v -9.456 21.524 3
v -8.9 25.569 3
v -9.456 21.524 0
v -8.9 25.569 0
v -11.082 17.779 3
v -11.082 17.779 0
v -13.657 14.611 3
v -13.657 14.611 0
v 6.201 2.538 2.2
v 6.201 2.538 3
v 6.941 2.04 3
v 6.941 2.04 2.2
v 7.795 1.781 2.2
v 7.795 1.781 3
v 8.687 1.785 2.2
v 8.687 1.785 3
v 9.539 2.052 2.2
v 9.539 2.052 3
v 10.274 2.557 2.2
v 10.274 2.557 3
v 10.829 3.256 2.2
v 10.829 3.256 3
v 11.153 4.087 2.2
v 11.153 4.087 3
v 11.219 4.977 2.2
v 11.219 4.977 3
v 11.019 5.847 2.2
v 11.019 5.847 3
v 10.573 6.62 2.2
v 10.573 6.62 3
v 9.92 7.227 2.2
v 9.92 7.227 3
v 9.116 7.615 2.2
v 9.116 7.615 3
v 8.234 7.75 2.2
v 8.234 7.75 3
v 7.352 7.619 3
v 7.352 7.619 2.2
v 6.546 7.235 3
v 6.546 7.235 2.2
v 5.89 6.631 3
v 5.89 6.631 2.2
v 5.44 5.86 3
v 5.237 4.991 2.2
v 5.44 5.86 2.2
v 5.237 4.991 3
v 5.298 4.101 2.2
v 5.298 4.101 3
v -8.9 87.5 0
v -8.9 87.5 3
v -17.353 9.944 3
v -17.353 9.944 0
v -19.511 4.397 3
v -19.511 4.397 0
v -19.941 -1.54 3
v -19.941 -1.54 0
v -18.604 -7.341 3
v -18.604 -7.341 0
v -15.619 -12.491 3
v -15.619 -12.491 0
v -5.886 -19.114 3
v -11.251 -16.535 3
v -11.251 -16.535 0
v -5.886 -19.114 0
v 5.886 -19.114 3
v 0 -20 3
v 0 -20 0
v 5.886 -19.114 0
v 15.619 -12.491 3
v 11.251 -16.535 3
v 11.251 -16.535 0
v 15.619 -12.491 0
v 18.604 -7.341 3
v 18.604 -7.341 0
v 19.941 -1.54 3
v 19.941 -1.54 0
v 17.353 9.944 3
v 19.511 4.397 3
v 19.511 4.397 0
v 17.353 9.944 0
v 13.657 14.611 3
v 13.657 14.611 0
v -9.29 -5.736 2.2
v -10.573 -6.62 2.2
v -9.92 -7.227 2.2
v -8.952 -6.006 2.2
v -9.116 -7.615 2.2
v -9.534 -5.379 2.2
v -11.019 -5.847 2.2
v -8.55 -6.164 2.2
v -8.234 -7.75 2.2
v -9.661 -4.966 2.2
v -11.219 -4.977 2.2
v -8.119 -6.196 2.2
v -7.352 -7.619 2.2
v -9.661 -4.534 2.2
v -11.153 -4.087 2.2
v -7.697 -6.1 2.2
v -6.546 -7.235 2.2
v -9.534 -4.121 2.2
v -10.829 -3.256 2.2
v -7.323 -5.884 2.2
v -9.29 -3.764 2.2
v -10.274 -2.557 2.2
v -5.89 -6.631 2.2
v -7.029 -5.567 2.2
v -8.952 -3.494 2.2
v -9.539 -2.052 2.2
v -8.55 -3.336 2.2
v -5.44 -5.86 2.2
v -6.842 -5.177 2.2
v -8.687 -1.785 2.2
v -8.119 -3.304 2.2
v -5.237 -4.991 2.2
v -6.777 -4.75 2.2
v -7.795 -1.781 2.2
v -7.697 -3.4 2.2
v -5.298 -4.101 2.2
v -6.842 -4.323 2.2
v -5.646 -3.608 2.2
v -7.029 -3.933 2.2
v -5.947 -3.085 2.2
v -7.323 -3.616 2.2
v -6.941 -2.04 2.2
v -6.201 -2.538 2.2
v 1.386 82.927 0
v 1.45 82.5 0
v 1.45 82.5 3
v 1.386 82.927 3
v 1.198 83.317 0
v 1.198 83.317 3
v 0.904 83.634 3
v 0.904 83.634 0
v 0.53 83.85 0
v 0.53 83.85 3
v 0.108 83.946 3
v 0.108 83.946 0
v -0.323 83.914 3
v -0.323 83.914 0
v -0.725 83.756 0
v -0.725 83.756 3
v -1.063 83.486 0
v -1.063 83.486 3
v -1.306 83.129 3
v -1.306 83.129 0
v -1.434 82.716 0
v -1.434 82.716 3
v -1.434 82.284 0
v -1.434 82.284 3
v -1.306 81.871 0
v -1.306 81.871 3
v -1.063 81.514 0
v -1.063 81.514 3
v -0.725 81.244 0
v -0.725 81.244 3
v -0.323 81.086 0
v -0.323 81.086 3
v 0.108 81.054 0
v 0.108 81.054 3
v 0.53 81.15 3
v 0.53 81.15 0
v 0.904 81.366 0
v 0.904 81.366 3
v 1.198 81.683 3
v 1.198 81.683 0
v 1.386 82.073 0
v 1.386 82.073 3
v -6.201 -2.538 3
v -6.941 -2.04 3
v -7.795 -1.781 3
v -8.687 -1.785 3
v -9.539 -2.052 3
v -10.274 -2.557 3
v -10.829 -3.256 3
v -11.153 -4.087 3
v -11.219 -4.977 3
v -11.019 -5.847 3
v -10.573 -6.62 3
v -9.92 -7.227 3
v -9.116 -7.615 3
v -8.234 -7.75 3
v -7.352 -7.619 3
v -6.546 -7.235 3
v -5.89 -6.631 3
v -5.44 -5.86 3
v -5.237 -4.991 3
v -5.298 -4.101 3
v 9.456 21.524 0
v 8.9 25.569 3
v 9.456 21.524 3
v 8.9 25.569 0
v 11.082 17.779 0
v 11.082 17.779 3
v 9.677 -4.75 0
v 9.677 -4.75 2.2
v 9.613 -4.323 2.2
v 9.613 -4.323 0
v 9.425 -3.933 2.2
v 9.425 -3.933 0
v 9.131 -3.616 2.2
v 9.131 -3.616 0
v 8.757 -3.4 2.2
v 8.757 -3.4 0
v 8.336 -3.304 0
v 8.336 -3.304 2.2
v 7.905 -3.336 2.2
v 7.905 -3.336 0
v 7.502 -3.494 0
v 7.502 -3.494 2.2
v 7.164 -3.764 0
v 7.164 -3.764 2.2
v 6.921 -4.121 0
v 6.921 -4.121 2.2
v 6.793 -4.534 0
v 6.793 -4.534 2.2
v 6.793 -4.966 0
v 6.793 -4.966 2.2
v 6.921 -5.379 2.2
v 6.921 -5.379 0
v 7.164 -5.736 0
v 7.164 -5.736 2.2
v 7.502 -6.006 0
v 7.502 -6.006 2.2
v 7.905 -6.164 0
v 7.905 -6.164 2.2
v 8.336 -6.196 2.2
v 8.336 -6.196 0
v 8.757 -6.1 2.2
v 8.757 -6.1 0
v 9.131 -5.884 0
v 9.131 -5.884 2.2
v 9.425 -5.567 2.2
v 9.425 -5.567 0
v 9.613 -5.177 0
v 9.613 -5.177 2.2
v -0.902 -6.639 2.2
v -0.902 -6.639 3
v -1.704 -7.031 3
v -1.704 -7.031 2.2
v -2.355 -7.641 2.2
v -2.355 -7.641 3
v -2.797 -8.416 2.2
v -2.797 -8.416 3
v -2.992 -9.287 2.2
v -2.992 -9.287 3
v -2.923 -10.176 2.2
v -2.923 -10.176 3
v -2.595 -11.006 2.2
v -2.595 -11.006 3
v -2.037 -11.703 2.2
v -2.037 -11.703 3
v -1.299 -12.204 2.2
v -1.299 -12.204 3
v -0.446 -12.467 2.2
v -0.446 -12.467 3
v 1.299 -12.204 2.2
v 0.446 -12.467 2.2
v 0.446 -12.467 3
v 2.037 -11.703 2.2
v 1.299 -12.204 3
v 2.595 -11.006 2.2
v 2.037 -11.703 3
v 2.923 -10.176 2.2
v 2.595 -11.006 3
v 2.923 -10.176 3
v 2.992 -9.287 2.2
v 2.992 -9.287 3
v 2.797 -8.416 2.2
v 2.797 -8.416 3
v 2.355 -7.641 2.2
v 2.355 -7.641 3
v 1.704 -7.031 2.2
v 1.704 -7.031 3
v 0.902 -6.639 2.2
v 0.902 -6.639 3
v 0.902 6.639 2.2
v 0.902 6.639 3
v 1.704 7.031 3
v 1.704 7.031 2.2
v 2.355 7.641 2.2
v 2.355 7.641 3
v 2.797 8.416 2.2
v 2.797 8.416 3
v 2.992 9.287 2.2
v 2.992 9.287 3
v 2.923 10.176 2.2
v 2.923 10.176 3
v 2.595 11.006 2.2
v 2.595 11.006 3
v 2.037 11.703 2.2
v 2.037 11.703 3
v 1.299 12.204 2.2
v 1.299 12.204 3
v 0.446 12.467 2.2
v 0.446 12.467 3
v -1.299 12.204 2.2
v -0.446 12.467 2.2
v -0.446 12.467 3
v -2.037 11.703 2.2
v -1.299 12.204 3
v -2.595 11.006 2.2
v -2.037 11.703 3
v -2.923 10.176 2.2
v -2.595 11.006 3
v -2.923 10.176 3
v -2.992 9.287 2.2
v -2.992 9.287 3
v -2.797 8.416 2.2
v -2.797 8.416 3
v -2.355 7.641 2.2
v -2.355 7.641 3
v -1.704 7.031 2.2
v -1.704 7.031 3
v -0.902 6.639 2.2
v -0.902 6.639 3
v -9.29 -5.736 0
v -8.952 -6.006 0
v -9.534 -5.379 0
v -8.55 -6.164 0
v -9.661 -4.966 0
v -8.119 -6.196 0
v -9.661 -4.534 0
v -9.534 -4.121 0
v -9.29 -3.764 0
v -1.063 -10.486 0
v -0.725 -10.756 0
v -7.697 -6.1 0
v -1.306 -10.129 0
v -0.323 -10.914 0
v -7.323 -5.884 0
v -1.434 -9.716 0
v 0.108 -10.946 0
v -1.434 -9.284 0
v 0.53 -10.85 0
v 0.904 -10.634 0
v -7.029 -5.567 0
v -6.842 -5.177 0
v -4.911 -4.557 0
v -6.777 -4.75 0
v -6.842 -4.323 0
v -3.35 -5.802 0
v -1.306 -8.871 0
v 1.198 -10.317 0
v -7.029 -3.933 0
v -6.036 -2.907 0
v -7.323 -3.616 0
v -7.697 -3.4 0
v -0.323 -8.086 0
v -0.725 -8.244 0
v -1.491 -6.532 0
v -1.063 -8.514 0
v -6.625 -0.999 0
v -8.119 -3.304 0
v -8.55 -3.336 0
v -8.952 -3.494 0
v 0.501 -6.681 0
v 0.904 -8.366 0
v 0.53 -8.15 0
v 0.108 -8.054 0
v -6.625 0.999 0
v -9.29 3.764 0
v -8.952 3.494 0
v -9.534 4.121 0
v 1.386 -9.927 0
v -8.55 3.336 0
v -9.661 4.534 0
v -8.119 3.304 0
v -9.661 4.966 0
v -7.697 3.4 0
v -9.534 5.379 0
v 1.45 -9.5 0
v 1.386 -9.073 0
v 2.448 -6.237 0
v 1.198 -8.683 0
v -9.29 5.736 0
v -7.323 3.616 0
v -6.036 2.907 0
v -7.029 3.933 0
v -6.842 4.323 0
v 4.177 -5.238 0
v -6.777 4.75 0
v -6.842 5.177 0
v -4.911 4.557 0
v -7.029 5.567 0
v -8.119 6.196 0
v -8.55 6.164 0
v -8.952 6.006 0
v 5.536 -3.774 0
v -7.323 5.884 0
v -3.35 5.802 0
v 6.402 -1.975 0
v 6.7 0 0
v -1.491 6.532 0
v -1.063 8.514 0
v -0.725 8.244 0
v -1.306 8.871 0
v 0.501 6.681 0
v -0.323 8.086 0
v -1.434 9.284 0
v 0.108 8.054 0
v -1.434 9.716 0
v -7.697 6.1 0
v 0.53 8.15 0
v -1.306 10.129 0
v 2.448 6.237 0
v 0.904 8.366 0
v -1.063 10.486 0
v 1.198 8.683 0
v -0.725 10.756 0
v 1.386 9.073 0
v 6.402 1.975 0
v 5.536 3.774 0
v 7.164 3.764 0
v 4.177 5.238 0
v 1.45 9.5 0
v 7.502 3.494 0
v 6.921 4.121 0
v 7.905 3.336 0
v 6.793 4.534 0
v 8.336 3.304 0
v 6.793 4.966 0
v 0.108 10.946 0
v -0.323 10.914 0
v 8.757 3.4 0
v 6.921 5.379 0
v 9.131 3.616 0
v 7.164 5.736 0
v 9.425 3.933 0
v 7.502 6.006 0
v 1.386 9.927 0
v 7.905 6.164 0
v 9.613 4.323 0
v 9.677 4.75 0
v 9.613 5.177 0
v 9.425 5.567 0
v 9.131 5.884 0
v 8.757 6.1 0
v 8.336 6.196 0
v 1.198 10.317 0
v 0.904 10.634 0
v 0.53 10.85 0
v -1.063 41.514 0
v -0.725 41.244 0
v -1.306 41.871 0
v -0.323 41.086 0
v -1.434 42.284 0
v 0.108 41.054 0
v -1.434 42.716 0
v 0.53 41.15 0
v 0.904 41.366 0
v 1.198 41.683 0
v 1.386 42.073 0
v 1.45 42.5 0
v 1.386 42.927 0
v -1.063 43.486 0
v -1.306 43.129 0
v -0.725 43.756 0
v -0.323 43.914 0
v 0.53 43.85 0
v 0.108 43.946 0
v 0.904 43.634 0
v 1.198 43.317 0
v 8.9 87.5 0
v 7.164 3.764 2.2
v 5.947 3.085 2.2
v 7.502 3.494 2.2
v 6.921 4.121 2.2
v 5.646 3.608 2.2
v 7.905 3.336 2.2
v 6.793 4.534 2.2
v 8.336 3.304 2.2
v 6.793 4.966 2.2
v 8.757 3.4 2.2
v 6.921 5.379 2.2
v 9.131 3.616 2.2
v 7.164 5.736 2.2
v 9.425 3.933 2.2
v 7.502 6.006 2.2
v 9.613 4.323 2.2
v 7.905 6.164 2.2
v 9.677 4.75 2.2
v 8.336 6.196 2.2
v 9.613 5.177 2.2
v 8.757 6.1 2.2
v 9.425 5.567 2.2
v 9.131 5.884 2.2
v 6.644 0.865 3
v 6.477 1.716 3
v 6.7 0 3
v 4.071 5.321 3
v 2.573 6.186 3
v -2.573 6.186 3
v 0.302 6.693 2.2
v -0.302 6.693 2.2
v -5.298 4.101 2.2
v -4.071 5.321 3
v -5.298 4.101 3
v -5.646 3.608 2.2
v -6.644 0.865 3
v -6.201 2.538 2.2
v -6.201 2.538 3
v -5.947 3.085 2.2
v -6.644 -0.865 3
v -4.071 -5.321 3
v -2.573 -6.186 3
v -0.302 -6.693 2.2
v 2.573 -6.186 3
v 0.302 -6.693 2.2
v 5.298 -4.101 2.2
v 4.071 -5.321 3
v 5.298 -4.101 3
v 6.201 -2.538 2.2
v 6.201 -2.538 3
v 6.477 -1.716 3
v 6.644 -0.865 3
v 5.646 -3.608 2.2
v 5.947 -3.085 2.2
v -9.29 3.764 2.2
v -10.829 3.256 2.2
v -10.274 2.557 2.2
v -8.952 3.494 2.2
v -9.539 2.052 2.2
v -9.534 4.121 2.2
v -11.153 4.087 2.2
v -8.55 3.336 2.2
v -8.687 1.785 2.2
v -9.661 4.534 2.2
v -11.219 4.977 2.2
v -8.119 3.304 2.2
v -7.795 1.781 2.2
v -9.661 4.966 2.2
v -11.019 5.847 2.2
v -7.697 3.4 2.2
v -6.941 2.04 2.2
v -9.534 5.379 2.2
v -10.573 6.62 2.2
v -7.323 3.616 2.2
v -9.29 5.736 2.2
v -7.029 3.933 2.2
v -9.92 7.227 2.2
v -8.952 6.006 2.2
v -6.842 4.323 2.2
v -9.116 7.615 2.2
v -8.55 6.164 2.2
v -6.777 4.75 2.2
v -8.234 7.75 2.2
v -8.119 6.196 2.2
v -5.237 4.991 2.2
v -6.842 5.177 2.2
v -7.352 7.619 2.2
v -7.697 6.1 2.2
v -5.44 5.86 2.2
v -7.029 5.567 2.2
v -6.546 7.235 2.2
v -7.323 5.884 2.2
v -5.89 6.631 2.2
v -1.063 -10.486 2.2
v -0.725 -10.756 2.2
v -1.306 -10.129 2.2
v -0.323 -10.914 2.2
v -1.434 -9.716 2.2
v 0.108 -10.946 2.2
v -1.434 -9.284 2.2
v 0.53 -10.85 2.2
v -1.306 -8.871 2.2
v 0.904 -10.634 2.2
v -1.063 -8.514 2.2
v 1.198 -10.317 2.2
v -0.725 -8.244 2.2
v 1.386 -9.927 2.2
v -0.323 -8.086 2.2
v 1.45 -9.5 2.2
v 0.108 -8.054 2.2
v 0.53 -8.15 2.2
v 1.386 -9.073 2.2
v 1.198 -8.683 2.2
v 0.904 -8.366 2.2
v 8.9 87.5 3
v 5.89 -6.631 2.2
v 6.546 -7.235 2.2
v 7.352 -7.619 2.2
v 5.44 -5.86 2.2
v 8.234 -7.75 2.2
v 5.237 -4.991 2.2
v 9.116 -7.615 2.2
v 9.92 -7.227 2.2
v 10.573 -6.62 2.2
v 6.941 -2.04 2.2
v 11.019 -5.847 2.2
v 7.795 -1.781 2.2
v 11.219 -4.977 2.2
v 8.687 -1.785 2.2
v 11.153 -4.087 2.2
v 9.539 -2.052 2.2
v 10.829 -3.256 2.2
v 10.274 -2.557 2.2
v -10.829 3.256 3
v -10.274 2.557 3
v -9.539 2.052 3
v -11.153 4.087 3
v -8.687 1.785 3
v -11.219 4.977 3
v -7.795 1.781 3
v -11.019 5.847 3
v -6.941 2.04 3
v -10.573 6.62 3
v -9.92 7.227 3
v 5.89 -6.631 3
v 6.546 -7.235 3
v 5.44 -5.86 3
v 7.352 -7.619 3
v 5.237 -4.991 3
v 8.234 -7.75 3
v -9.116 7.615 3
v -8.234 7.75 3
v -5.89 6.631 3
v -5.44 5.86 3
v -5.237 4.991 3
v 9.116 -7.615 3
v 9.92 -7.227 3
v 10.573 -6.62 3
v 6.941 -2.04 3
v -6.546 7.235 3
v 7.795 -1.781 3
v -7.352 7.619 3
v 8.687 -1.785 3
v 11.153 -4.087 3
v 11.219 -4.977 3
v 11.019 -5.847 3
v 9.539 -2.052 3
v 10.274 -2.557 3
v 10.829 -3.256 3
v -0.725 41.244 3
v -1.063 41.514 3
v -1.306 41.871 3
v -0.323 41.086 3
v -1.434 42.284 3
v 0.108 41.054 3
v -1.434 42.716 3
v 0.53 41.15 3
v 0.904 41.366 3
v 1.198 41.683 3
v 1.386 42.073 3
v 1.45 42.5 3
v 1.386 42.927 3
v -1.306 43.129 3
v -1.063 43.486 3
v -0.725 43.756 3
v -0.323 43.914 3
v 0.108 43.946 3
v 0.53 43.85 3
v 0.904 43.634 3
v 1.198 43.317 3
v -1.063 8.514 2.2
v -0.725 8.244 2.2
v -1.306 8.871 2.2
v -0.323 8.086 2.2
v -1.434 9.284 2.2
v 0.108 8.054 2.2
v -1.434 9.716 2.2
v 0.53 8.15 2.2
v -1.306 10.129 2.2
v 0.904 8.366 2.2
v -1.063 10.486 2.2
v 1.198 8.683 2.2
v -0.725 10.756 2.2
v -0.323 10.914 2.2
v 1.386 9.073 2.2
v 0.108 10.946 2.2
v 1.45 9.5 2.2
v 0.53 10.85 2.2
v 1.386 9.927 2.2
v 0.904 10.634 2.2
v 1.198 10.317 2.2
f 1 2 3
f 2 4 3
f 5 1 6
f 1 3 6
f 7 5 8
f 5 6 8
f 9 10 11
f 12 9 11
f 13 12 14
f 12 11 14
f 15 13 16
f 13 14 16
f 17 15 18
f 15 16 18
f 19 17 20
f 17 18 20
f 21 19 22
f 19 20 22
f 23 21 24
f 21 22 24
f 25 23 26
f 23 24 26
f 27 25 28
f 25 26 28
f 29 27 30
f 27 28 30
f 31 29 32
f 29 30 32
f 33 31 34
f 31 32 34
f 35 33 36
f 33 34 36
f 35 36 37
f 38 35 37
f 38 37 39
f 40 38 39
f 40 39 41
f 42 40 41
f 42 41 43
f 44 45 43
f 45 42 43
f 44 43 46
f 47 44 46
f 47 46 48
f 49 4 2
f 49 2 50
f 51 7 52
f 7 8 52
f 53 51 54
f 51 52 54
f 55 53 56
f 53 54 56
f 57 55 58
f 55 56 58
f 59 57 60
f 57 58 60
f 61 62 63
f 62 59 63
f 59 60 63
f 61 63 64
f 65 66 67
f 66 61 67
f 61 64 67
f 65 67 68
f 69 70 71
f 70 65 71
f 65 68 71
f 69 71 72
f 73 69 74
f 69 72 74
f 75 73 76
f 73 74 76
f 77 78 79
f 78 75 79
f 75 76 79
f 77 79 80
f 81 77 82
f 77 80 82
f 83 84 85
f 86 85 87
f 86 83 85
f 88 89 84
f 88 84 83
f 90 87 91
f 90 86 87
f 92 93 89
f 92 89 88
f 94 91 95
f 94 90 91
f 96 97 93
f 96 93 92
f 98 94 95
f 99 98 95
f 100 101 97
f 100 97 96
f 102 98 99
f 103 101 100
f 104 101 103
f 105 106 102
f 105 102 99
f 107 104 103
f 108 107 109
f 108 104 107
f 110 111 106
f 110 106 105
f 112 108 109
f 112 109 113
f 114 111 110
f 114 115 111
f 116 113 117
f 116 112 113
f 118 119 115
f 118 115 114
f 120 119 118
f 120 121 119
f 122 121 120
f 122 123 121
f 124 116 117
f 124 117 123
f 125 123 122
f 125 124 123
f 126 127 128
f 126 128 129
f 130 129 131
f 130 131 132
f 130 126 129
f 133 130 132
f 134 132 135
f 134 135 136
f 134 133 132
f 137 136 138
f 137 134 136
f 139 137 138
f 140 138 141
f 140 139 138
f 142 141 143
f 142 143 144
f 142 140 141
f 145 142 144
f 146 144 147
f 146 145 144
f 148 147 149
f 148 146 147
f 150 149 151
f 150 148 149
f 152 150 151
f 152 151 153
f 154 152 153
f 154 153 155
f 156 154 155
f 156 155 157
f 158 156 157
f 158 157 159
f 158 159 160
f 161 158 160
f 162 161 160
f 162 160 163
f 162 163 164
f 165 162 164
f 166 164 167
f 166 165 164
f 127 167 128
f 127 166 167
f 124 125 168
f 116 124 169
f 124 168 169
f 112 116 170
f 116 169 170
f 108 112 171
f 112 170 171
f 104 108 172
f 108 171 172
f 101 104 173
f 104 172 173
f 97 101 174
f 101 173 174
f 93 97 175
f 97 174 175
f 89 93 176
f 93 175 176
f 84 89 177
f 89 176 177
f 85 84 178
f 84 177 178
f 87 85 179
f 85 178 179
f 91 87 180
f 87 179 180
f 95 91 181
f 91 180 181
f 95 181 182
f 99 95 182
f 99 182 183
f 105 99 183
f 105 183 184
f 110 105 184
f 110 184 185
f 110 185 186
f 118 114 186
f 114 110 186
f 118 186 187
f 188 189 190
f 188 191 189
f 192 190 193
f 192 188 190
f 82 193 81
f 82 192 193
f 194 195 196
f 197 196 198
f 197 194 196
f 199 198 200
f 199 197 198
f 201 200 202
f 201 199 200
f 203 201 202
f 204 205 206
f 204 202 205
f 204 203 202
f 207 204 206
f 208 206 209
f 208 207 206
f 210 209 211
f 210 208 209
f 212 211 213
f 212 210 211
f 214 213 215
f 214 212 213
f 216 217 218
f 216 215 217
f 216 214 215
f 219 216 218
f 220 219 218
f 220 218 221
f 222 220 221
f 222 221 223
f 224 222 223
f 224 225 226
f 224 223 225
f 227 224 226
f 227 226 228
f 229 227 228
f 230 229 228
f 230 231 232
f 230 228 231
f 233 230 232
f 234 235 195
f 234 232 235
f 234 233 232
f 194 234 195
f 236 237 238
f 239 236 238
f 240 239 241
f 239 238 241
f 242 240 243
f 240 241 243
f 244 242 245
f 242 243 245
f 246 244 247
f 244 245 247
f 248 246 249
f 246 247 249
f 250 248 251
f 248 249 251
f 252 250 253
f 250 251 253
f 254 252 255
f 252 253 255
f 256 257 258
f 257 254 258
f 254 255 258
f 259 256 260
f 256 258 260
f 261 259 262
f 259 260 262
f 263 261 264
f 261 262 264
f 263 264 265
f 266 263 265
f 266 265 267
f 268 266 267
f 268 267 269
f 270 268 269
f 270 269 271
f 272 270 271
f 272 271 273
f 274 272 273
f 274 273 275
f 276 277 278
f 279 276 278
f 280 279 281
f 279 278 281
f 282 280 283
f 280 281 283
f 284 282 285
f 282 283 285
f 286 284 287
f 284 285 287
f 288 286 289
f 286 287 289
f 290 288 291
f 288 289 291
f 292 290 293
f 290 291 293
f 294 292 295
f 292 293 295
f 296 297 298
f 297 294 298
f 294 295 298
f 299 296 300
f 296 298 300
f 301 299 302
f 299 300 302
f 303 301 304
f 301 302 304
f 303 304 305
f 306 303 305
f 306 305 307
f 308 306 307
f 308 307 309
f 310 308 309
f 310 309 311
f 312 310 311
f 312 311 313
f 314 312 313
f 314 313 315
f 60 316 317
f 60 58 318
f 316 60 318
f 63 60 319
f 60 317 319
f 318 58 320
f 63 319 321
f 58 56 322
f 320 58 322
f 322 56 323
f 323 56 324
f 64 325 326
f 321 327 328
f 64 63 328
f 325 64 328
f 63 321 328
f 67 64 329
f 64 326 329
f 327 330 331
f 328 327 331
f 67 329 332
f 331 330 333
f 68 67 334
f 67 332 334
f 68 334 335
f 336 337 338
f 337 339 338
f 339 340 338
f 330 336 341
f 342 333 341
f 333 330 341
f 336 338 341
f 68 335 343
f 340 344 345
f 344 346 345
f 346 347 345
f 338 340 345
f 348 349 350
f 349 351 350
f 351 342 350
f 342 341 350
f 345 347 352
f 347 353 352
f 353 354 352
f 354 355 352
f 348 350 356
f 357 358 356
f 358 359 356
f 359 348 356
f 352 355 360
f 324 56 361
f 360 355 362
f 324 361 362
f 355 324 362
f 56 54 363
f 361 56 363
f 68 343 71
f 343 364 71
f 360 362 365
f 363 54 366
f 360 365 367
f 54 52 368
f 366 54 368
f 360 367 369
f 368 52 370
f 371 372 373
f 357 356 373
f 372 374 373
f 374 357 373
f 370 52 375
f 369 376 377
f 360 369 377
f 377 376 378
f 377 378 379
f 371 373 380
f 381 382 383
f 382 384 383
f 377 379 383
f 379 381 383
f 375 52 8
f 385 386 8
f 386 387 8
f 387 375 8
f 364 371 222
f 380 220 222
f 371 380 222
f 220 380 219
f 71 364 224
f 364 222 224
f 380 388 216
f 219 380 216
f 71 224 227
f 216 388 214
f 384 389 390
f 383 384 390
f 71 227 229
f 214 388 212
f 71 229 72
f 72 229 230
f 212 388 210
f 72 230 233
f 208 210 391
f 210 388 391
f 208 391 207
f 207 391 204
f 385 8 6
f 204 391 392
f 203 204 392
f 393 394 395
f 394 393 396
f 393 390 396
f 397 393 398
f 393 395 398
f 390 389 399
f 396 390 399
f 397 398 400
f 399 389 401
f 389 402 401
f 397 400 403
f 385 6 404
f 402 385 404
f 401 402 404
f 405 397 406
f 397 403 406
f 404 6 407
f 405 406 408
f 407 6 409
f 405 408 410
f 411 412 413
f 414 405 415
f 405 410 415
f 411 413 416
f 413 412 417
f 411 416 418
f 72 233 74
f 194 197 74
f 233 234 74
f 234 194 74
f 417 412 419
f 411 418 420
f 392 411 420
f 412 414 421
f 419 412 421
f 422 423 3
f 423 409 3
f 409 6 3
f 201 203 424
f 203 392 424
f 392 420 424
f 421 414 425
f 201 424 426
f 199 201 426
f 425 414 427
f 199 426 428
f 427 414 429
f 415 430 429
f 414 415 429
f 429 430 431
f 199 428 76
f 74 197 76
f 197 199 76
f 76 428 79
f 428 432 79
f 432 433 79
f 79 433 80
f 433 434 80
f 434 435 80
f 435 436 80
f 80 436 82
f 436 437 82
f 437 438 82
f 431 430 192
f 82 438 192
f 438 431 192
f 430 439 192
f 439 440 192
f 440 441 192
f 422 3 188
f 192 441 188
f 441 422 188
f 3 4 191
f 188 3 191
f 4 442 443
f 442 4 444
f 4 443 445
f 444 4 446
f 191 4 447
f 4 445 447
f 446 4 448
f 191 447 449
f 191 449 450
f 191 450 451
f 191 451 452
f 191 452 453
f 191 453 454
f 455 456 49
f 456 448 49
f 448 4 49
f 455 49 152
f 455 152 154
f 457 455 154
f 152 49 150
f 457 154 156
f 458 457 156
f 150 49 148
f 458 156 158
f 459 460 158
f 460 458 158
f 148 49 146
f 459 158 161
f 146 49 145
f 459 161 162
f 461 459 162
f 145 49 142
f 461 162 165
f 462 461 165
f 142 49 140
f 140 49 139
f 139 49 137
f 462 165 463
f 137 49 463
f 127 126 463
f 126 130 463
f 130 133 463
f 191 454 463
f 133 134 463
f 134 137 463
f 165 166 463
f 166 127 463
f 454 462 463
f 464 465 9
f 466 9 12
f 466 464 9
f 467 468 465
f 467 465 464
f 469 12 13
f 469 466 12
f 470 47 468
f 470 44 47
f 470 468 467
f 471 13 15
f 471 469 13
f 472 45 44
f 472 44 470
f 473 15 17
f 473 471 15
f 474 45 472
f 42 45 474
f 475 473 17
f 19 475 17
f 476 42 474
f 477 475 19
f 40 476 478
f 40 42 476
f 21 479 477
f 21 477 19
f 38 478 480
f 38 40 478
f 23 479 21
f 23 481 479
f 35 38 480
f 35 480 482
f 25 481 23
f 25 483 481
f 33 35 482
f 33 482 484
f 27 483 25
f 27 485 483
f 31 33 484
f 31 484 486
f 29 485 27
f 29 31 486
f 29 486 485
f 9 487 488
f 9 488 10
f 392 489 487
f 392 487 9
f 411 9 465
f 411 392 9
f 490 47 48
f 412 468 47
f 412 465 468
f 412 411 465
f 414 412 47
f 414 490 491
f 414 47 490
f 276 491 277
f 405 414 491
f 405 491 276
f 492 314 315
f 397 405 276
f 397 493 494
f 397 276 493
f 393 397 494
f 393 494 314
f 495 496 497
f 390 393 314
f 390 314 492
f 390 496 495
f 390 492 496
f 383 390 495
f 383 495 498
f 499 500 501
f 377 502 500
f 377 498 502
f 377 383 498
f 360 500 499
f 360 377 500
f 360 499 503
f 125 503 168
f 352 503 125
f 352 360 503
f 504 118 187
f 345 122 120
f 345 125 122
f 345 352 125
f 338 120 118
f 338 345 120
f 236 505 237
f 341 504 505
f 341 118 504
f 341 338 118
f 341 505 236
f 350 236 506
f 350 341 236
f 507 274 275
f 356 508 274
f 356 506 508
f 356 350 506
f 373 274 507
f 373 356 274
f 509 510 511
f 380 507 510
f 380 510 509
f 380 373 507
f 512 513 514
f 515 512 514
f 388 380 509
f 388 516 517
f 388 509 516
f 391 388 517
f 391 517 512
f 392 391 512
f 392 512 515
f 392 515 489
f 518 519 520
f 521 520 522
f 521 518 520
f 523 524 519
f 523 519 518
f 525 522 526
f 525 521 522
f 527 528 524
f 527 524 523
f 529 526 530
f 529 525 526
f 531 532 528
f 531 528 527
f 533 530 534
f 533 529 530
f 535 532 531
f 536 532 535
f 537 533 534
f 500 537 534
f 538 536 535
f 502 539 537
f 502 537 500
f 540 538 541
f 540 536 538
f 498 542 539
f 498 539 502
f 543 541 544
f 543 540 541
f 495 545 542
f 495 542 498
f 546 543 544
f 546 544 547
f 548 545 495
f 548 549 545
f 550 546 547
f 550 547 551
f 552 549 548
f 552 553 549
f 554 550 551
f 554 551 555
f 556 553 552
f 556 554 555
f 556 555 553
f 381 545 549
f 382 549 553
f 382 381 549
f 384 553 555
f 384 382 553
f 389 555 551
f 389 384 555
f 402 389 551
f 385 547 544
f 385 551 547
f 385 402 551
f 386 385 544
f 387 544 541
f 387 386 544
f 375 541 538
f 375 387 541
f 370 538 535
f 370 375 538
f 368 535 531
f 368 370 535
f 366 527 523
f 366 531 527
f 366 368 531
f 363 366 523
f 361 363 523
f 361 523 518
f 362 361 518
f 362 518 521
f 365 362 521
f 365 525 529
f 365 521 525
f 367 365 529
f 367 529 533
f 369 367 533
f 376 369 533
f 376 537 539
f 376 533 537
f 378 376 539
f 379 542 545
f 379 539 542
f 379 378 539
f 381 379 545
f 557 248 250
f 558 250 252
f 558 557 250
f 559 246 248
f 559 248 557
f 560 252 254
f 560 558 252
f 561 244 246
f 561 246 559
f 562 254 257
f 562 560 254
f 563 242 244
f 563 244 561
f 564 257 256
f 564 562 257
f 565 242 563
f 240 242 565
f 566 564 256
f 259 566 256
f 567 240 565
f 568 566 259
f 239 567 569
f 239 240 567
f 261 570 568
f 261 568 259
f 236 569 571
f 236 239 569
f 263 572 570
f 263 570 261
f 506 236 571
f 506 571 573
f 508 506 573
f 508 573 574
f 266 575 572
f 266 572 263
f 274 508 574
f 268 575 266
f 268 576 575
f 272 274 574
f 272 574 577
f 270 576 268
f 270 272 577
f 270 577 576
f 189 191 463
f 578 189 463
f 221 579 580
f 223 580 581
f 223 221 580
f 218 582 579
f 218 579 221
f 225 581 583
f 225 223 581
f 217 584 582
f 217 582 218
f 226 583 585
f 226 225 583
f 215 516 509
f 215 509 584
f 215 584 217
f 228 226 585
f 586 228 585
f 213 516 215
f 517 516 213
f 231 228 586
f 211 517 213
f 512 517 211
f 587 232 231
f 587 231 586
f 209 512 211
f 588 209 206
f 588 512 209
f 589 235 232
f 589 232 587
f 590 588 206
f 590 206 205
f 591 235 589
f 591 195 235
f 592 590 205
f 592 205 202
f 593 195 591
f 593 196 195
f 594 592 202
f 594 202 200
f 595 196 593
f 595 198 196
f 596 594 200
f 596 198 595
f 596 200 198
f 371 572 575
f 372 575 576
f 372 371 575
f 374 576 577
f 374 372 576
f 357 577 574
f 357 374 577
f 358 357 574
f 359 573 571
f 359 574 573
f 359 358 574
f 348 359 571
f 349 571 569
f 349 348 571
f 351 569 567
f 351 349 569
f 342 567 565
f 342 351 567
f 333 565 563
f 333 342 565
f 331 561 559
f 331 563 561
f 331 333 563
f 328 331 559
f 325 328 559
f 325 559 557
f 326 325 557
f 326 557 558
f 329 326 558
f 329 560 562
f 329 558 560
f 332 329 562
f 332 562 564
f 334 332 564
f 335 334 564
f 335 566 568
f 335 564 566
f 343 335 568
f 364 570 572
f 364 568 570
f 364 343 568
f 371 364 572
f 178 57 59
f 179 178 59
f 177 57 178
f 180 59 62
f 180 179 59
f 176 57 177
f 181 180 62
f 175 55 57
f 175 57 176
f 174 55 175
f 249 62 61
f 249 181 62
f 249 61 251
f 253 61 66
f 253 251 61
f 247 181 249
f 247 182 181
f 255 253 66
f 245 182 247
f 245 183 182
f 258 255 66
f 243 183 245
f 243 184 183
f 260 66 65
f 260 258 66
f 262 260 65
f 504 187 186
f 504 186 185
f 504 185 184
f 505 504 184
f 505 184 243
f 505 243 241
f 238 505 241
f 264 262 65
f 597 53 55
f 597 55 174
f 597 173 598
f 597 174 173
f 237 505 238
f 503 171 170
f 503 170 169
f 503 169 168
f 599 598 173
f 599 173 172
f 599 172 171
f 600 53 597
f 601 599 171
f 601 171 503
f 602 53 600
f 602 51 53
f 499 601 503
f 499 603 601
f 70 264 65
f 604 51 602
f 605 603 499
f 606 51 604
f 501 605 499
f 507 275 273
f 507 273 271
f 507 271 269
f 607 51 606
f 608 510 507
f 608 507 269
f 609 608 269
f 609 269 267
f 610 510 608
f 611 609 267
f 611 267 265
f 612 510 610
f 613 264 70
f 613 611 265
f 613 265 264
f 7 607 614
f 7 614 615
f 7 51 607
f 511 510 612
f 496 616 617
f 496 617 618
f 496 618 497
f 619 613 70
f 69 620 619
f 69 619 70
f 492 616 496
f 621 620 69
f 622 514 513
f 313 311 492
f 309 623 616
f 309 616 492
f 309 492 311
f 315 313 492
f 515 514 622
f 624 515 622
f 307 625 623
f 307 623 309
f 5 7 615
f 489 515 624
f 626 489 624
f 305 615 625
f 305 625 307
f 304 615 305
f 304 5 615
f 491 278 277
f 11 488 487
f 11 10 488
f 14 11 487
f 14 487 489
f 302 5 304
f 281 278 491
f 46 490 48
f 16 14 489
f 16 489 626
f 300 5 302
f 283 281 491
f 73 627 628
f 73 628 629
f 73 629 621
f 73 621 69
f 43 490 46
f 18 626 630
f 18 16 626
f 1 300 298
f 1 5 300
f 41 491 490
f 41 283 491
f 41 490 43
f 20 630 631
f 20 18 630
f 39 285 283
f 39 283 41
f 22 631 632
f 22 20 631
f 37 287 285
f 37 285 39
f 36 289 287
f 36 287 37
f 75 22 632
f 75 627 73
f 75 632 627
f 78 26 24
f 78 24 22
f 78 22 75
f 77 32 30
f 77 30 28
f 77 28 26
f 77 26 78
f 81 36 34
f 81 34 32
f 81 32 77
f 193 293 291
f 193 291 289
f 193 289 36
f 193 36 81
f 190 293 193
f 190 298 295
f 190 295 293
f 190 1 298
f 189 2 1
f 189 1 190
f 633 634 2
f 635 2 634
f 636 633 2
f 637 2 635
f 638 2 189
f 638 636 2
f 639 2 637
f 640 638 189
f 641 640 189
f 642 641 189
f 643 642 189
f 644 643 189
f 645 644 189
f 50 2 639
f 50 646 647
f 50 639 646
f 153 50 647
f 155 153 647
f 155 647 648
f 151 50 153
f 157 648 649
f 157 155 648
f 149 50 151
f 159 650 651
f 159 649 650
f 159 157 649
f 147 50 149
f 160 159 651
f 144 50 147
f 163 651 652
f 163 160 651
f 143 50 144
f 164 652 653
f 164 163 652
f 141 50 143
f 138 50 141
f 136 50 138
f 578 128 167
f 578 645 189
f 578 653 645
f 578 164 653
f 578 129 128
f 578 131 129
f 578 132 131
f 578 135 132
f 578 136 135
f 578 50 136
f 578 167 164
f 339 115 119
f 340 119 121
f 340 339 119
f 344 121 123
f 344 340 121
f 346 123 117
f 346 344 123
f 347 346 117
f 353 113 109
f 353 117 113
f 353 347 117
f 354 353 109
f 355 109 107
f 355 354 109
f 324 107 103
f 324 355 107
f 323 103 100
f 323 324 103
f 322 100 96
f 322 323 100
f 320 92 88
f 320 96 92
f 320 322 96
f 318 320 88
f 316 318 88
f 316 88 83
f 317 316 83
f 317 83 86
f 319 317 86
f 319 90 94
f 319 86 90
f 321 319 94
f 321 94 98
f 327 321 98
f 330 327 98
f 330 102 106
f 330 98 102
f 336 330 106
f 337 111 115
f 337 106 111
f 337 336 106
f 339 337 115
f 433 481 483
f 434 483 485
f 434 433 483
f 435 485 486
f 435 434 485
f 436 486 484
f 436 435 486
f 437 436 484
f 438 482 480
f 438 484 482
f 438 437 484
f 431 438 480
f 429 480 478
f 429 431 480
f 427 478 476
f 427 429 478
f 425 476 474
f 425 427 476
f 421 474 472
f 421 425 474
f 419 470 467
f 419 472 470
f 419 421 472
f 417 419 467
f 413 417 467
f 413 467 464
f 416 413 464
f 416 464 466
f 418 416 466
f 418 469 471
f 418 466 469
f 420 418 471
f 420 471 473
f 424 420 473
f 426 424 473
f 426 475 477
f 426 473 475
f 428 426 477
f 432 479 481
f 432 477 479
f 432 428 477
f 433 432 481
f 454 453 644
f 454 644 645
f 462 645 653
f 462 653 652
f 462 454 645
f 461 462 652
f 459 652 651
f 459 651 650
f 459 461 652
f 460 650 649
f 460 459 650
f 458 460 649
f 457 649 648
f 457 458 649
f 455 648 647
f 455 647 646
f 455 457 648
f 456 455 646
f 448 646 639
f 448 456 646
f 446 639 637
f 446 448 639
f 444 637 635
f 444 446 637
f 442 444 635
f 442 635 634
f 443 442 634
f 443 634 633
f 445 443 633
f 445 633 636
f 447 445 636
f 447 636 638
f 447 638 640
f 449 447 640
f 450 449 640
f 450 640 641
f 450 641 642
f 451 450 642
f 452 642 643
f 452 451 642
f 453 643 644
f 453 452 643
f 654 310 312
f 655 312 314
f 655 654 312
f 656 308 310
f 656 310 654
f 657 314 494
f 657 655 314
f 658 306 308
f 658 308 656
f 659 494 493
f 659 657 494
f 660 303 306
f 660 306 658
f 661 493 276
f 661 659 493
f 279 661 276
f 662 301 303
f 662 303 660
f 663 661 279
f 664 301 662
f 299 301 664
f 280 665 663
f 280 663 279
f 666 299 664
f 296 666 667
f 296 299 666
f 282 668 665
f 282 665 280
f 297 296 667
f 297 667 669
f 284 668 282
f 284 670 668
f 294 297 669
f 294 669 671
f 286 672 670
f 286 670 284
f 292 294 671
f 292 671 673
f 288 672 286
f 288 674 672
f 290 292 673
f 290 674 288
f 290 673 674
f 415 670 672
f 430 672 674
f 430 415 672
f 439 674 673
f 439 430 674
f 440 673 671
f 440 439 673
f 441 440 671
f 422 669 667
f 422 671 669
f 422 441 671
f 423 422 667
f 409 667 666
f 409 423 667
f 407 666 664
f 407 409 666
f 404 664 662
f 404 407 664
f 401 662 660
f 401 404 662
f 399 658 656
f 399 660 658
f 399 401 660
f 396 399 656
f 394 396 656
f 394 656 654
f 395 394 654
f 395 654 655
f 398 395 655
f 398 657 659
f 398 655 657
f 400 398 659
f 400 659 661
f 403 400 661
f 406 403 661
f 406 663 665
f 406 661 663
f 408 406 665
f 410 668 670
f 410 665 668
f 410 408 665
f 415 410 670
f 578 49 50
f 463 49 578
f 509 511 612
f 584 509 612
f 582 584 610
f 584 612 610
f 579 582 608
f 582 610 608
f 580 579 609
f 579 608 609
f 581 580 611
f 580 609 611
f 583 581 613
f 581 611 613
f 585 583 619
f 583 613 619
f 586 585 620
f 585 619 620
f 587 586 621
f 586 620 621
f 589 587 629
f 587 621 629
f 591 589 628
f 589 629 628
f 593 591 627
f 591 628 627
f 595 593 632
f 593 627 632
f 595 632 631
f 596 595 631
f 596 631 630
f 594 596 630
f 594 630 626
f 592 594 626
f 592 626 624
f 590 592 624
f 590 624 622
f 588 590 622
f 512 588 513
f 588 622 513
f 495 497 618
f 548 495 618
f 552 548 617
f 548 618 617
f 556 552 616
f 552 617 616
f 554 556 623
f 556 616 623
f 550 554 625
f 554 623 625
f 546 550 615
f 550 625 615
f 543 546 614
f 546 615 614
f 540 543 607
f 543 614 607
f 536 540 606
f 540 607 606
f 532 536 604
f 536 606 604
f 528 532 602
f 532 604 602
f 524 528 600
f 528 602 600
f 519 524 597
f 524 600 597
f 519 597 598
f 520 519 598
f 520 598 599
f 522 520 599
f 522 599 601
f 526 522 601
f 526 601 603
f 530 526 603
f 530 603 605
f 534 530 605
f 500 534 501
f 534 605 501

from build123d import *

# Parameters (mm, degrees)
SKETCH_1_R          = 20
SKETCH_1_R_2        = 6.7
SKETCH_1_R_3        = 1.45
EXTRUDE_1_DEPTH     = 3
SKETCH_2_W          = 17.8
SKETCH_2_H          = 75
SKETCH_2_R          = 1.45
EXTRUDE_2_DEPTH     = 3
FILLET_1_R          = 15
SKETCH_3_R          = 3
CUT_EXTRUDE_1_DEPTH = 0.8


with BuildPart() as part:
    # 草图1 → 凸台-拉伸1 (new body)
    with BuildSketch(Plane.XY):
        Circle(SKETCH_1_R)
        Circle(SKETCH_1_R_2, mode=Mode.SUBTRACT)
        with Locations((0, 9.5)):
            Circle(SKETCH_1_R_3, mode=Mode.SUBTRACT)
        with Locations((8.227241336, 4.75)):
            Circle(SKETCH_1_R_3, mode=Mode.SUBTRACT)
        with Locations((8.227241336, -4.75)):
            Circle(SKETCH_1_R_3, mode=Mode.SUBTRACT)
        with Locations((0, -9.5)):
            Circle(SKETCH_1_R_3, mode=Mode.SUBTRACT)
        with Locations((-8.227241336, -4.75)):
            Circle(SKETCH_1_R_3, mode=Mode.SUBTRACT)
        with Locations((-8.227241336, 4.75)):
            Circle(SKETCH_1_R_3, mode=Mode.SUBTRACT)
    extrude(amount=EXTRUDE_1_DEPTH)

    # 草图2 → 凸台-拉伸2 (add)
    with BuildSketch(Plane.XY):
        with Locations((0, 50)):
            Rectangle(SKETCH_2_W, SKETCH_2_H)
        with Locations((0, 42.5)):
            Circle(SKETCH_2_R, mode=Mode.SUBTRACT)
        with Locations((0, 82.5)):
            Circle(SKETCH_2_R, mode=Mode.SUBTRACT)
    extrude(amount=EXTRUDE_2_DEPTH)

    # 圆角1
    fillet_1_edges = [part.edges().sort_by_distance(p)[0] for p in [
        (-8.9, 17.91061138, 1.5),
        (8.9, 17.91061138, 1.5),
    ]]
    fillet(fillet_1_edges, radius=FILLET_1_R)

    # 草图3 → 切除-拉伸1 (cut)
    with BuildSketch(Plane.XY.offset(3)):
        with Locations((0, 9.5)):
            Circle(SKETCH_3_R)
        with Locations((8.227241336, 4.75)):
            Circle(SKETCH_3_R)
        with Locations((8.227241336, -4.75)):
            Circle(SKETCH_3_R)
        with Locations((0, -9.5)):
            Circle(SKETCH_3_R)
        with Locations((-8.227241336, -4.75)):
            Circle(SKETCH_3_R)
        with Locations((-8.227241336, 4.75)):
            Circle(SKETCH_3_R)
    extrude(amount=-CUT_EXTRUDE_1_DEPTH, mode=Mode.SUBTRACT)


solid = part.part
